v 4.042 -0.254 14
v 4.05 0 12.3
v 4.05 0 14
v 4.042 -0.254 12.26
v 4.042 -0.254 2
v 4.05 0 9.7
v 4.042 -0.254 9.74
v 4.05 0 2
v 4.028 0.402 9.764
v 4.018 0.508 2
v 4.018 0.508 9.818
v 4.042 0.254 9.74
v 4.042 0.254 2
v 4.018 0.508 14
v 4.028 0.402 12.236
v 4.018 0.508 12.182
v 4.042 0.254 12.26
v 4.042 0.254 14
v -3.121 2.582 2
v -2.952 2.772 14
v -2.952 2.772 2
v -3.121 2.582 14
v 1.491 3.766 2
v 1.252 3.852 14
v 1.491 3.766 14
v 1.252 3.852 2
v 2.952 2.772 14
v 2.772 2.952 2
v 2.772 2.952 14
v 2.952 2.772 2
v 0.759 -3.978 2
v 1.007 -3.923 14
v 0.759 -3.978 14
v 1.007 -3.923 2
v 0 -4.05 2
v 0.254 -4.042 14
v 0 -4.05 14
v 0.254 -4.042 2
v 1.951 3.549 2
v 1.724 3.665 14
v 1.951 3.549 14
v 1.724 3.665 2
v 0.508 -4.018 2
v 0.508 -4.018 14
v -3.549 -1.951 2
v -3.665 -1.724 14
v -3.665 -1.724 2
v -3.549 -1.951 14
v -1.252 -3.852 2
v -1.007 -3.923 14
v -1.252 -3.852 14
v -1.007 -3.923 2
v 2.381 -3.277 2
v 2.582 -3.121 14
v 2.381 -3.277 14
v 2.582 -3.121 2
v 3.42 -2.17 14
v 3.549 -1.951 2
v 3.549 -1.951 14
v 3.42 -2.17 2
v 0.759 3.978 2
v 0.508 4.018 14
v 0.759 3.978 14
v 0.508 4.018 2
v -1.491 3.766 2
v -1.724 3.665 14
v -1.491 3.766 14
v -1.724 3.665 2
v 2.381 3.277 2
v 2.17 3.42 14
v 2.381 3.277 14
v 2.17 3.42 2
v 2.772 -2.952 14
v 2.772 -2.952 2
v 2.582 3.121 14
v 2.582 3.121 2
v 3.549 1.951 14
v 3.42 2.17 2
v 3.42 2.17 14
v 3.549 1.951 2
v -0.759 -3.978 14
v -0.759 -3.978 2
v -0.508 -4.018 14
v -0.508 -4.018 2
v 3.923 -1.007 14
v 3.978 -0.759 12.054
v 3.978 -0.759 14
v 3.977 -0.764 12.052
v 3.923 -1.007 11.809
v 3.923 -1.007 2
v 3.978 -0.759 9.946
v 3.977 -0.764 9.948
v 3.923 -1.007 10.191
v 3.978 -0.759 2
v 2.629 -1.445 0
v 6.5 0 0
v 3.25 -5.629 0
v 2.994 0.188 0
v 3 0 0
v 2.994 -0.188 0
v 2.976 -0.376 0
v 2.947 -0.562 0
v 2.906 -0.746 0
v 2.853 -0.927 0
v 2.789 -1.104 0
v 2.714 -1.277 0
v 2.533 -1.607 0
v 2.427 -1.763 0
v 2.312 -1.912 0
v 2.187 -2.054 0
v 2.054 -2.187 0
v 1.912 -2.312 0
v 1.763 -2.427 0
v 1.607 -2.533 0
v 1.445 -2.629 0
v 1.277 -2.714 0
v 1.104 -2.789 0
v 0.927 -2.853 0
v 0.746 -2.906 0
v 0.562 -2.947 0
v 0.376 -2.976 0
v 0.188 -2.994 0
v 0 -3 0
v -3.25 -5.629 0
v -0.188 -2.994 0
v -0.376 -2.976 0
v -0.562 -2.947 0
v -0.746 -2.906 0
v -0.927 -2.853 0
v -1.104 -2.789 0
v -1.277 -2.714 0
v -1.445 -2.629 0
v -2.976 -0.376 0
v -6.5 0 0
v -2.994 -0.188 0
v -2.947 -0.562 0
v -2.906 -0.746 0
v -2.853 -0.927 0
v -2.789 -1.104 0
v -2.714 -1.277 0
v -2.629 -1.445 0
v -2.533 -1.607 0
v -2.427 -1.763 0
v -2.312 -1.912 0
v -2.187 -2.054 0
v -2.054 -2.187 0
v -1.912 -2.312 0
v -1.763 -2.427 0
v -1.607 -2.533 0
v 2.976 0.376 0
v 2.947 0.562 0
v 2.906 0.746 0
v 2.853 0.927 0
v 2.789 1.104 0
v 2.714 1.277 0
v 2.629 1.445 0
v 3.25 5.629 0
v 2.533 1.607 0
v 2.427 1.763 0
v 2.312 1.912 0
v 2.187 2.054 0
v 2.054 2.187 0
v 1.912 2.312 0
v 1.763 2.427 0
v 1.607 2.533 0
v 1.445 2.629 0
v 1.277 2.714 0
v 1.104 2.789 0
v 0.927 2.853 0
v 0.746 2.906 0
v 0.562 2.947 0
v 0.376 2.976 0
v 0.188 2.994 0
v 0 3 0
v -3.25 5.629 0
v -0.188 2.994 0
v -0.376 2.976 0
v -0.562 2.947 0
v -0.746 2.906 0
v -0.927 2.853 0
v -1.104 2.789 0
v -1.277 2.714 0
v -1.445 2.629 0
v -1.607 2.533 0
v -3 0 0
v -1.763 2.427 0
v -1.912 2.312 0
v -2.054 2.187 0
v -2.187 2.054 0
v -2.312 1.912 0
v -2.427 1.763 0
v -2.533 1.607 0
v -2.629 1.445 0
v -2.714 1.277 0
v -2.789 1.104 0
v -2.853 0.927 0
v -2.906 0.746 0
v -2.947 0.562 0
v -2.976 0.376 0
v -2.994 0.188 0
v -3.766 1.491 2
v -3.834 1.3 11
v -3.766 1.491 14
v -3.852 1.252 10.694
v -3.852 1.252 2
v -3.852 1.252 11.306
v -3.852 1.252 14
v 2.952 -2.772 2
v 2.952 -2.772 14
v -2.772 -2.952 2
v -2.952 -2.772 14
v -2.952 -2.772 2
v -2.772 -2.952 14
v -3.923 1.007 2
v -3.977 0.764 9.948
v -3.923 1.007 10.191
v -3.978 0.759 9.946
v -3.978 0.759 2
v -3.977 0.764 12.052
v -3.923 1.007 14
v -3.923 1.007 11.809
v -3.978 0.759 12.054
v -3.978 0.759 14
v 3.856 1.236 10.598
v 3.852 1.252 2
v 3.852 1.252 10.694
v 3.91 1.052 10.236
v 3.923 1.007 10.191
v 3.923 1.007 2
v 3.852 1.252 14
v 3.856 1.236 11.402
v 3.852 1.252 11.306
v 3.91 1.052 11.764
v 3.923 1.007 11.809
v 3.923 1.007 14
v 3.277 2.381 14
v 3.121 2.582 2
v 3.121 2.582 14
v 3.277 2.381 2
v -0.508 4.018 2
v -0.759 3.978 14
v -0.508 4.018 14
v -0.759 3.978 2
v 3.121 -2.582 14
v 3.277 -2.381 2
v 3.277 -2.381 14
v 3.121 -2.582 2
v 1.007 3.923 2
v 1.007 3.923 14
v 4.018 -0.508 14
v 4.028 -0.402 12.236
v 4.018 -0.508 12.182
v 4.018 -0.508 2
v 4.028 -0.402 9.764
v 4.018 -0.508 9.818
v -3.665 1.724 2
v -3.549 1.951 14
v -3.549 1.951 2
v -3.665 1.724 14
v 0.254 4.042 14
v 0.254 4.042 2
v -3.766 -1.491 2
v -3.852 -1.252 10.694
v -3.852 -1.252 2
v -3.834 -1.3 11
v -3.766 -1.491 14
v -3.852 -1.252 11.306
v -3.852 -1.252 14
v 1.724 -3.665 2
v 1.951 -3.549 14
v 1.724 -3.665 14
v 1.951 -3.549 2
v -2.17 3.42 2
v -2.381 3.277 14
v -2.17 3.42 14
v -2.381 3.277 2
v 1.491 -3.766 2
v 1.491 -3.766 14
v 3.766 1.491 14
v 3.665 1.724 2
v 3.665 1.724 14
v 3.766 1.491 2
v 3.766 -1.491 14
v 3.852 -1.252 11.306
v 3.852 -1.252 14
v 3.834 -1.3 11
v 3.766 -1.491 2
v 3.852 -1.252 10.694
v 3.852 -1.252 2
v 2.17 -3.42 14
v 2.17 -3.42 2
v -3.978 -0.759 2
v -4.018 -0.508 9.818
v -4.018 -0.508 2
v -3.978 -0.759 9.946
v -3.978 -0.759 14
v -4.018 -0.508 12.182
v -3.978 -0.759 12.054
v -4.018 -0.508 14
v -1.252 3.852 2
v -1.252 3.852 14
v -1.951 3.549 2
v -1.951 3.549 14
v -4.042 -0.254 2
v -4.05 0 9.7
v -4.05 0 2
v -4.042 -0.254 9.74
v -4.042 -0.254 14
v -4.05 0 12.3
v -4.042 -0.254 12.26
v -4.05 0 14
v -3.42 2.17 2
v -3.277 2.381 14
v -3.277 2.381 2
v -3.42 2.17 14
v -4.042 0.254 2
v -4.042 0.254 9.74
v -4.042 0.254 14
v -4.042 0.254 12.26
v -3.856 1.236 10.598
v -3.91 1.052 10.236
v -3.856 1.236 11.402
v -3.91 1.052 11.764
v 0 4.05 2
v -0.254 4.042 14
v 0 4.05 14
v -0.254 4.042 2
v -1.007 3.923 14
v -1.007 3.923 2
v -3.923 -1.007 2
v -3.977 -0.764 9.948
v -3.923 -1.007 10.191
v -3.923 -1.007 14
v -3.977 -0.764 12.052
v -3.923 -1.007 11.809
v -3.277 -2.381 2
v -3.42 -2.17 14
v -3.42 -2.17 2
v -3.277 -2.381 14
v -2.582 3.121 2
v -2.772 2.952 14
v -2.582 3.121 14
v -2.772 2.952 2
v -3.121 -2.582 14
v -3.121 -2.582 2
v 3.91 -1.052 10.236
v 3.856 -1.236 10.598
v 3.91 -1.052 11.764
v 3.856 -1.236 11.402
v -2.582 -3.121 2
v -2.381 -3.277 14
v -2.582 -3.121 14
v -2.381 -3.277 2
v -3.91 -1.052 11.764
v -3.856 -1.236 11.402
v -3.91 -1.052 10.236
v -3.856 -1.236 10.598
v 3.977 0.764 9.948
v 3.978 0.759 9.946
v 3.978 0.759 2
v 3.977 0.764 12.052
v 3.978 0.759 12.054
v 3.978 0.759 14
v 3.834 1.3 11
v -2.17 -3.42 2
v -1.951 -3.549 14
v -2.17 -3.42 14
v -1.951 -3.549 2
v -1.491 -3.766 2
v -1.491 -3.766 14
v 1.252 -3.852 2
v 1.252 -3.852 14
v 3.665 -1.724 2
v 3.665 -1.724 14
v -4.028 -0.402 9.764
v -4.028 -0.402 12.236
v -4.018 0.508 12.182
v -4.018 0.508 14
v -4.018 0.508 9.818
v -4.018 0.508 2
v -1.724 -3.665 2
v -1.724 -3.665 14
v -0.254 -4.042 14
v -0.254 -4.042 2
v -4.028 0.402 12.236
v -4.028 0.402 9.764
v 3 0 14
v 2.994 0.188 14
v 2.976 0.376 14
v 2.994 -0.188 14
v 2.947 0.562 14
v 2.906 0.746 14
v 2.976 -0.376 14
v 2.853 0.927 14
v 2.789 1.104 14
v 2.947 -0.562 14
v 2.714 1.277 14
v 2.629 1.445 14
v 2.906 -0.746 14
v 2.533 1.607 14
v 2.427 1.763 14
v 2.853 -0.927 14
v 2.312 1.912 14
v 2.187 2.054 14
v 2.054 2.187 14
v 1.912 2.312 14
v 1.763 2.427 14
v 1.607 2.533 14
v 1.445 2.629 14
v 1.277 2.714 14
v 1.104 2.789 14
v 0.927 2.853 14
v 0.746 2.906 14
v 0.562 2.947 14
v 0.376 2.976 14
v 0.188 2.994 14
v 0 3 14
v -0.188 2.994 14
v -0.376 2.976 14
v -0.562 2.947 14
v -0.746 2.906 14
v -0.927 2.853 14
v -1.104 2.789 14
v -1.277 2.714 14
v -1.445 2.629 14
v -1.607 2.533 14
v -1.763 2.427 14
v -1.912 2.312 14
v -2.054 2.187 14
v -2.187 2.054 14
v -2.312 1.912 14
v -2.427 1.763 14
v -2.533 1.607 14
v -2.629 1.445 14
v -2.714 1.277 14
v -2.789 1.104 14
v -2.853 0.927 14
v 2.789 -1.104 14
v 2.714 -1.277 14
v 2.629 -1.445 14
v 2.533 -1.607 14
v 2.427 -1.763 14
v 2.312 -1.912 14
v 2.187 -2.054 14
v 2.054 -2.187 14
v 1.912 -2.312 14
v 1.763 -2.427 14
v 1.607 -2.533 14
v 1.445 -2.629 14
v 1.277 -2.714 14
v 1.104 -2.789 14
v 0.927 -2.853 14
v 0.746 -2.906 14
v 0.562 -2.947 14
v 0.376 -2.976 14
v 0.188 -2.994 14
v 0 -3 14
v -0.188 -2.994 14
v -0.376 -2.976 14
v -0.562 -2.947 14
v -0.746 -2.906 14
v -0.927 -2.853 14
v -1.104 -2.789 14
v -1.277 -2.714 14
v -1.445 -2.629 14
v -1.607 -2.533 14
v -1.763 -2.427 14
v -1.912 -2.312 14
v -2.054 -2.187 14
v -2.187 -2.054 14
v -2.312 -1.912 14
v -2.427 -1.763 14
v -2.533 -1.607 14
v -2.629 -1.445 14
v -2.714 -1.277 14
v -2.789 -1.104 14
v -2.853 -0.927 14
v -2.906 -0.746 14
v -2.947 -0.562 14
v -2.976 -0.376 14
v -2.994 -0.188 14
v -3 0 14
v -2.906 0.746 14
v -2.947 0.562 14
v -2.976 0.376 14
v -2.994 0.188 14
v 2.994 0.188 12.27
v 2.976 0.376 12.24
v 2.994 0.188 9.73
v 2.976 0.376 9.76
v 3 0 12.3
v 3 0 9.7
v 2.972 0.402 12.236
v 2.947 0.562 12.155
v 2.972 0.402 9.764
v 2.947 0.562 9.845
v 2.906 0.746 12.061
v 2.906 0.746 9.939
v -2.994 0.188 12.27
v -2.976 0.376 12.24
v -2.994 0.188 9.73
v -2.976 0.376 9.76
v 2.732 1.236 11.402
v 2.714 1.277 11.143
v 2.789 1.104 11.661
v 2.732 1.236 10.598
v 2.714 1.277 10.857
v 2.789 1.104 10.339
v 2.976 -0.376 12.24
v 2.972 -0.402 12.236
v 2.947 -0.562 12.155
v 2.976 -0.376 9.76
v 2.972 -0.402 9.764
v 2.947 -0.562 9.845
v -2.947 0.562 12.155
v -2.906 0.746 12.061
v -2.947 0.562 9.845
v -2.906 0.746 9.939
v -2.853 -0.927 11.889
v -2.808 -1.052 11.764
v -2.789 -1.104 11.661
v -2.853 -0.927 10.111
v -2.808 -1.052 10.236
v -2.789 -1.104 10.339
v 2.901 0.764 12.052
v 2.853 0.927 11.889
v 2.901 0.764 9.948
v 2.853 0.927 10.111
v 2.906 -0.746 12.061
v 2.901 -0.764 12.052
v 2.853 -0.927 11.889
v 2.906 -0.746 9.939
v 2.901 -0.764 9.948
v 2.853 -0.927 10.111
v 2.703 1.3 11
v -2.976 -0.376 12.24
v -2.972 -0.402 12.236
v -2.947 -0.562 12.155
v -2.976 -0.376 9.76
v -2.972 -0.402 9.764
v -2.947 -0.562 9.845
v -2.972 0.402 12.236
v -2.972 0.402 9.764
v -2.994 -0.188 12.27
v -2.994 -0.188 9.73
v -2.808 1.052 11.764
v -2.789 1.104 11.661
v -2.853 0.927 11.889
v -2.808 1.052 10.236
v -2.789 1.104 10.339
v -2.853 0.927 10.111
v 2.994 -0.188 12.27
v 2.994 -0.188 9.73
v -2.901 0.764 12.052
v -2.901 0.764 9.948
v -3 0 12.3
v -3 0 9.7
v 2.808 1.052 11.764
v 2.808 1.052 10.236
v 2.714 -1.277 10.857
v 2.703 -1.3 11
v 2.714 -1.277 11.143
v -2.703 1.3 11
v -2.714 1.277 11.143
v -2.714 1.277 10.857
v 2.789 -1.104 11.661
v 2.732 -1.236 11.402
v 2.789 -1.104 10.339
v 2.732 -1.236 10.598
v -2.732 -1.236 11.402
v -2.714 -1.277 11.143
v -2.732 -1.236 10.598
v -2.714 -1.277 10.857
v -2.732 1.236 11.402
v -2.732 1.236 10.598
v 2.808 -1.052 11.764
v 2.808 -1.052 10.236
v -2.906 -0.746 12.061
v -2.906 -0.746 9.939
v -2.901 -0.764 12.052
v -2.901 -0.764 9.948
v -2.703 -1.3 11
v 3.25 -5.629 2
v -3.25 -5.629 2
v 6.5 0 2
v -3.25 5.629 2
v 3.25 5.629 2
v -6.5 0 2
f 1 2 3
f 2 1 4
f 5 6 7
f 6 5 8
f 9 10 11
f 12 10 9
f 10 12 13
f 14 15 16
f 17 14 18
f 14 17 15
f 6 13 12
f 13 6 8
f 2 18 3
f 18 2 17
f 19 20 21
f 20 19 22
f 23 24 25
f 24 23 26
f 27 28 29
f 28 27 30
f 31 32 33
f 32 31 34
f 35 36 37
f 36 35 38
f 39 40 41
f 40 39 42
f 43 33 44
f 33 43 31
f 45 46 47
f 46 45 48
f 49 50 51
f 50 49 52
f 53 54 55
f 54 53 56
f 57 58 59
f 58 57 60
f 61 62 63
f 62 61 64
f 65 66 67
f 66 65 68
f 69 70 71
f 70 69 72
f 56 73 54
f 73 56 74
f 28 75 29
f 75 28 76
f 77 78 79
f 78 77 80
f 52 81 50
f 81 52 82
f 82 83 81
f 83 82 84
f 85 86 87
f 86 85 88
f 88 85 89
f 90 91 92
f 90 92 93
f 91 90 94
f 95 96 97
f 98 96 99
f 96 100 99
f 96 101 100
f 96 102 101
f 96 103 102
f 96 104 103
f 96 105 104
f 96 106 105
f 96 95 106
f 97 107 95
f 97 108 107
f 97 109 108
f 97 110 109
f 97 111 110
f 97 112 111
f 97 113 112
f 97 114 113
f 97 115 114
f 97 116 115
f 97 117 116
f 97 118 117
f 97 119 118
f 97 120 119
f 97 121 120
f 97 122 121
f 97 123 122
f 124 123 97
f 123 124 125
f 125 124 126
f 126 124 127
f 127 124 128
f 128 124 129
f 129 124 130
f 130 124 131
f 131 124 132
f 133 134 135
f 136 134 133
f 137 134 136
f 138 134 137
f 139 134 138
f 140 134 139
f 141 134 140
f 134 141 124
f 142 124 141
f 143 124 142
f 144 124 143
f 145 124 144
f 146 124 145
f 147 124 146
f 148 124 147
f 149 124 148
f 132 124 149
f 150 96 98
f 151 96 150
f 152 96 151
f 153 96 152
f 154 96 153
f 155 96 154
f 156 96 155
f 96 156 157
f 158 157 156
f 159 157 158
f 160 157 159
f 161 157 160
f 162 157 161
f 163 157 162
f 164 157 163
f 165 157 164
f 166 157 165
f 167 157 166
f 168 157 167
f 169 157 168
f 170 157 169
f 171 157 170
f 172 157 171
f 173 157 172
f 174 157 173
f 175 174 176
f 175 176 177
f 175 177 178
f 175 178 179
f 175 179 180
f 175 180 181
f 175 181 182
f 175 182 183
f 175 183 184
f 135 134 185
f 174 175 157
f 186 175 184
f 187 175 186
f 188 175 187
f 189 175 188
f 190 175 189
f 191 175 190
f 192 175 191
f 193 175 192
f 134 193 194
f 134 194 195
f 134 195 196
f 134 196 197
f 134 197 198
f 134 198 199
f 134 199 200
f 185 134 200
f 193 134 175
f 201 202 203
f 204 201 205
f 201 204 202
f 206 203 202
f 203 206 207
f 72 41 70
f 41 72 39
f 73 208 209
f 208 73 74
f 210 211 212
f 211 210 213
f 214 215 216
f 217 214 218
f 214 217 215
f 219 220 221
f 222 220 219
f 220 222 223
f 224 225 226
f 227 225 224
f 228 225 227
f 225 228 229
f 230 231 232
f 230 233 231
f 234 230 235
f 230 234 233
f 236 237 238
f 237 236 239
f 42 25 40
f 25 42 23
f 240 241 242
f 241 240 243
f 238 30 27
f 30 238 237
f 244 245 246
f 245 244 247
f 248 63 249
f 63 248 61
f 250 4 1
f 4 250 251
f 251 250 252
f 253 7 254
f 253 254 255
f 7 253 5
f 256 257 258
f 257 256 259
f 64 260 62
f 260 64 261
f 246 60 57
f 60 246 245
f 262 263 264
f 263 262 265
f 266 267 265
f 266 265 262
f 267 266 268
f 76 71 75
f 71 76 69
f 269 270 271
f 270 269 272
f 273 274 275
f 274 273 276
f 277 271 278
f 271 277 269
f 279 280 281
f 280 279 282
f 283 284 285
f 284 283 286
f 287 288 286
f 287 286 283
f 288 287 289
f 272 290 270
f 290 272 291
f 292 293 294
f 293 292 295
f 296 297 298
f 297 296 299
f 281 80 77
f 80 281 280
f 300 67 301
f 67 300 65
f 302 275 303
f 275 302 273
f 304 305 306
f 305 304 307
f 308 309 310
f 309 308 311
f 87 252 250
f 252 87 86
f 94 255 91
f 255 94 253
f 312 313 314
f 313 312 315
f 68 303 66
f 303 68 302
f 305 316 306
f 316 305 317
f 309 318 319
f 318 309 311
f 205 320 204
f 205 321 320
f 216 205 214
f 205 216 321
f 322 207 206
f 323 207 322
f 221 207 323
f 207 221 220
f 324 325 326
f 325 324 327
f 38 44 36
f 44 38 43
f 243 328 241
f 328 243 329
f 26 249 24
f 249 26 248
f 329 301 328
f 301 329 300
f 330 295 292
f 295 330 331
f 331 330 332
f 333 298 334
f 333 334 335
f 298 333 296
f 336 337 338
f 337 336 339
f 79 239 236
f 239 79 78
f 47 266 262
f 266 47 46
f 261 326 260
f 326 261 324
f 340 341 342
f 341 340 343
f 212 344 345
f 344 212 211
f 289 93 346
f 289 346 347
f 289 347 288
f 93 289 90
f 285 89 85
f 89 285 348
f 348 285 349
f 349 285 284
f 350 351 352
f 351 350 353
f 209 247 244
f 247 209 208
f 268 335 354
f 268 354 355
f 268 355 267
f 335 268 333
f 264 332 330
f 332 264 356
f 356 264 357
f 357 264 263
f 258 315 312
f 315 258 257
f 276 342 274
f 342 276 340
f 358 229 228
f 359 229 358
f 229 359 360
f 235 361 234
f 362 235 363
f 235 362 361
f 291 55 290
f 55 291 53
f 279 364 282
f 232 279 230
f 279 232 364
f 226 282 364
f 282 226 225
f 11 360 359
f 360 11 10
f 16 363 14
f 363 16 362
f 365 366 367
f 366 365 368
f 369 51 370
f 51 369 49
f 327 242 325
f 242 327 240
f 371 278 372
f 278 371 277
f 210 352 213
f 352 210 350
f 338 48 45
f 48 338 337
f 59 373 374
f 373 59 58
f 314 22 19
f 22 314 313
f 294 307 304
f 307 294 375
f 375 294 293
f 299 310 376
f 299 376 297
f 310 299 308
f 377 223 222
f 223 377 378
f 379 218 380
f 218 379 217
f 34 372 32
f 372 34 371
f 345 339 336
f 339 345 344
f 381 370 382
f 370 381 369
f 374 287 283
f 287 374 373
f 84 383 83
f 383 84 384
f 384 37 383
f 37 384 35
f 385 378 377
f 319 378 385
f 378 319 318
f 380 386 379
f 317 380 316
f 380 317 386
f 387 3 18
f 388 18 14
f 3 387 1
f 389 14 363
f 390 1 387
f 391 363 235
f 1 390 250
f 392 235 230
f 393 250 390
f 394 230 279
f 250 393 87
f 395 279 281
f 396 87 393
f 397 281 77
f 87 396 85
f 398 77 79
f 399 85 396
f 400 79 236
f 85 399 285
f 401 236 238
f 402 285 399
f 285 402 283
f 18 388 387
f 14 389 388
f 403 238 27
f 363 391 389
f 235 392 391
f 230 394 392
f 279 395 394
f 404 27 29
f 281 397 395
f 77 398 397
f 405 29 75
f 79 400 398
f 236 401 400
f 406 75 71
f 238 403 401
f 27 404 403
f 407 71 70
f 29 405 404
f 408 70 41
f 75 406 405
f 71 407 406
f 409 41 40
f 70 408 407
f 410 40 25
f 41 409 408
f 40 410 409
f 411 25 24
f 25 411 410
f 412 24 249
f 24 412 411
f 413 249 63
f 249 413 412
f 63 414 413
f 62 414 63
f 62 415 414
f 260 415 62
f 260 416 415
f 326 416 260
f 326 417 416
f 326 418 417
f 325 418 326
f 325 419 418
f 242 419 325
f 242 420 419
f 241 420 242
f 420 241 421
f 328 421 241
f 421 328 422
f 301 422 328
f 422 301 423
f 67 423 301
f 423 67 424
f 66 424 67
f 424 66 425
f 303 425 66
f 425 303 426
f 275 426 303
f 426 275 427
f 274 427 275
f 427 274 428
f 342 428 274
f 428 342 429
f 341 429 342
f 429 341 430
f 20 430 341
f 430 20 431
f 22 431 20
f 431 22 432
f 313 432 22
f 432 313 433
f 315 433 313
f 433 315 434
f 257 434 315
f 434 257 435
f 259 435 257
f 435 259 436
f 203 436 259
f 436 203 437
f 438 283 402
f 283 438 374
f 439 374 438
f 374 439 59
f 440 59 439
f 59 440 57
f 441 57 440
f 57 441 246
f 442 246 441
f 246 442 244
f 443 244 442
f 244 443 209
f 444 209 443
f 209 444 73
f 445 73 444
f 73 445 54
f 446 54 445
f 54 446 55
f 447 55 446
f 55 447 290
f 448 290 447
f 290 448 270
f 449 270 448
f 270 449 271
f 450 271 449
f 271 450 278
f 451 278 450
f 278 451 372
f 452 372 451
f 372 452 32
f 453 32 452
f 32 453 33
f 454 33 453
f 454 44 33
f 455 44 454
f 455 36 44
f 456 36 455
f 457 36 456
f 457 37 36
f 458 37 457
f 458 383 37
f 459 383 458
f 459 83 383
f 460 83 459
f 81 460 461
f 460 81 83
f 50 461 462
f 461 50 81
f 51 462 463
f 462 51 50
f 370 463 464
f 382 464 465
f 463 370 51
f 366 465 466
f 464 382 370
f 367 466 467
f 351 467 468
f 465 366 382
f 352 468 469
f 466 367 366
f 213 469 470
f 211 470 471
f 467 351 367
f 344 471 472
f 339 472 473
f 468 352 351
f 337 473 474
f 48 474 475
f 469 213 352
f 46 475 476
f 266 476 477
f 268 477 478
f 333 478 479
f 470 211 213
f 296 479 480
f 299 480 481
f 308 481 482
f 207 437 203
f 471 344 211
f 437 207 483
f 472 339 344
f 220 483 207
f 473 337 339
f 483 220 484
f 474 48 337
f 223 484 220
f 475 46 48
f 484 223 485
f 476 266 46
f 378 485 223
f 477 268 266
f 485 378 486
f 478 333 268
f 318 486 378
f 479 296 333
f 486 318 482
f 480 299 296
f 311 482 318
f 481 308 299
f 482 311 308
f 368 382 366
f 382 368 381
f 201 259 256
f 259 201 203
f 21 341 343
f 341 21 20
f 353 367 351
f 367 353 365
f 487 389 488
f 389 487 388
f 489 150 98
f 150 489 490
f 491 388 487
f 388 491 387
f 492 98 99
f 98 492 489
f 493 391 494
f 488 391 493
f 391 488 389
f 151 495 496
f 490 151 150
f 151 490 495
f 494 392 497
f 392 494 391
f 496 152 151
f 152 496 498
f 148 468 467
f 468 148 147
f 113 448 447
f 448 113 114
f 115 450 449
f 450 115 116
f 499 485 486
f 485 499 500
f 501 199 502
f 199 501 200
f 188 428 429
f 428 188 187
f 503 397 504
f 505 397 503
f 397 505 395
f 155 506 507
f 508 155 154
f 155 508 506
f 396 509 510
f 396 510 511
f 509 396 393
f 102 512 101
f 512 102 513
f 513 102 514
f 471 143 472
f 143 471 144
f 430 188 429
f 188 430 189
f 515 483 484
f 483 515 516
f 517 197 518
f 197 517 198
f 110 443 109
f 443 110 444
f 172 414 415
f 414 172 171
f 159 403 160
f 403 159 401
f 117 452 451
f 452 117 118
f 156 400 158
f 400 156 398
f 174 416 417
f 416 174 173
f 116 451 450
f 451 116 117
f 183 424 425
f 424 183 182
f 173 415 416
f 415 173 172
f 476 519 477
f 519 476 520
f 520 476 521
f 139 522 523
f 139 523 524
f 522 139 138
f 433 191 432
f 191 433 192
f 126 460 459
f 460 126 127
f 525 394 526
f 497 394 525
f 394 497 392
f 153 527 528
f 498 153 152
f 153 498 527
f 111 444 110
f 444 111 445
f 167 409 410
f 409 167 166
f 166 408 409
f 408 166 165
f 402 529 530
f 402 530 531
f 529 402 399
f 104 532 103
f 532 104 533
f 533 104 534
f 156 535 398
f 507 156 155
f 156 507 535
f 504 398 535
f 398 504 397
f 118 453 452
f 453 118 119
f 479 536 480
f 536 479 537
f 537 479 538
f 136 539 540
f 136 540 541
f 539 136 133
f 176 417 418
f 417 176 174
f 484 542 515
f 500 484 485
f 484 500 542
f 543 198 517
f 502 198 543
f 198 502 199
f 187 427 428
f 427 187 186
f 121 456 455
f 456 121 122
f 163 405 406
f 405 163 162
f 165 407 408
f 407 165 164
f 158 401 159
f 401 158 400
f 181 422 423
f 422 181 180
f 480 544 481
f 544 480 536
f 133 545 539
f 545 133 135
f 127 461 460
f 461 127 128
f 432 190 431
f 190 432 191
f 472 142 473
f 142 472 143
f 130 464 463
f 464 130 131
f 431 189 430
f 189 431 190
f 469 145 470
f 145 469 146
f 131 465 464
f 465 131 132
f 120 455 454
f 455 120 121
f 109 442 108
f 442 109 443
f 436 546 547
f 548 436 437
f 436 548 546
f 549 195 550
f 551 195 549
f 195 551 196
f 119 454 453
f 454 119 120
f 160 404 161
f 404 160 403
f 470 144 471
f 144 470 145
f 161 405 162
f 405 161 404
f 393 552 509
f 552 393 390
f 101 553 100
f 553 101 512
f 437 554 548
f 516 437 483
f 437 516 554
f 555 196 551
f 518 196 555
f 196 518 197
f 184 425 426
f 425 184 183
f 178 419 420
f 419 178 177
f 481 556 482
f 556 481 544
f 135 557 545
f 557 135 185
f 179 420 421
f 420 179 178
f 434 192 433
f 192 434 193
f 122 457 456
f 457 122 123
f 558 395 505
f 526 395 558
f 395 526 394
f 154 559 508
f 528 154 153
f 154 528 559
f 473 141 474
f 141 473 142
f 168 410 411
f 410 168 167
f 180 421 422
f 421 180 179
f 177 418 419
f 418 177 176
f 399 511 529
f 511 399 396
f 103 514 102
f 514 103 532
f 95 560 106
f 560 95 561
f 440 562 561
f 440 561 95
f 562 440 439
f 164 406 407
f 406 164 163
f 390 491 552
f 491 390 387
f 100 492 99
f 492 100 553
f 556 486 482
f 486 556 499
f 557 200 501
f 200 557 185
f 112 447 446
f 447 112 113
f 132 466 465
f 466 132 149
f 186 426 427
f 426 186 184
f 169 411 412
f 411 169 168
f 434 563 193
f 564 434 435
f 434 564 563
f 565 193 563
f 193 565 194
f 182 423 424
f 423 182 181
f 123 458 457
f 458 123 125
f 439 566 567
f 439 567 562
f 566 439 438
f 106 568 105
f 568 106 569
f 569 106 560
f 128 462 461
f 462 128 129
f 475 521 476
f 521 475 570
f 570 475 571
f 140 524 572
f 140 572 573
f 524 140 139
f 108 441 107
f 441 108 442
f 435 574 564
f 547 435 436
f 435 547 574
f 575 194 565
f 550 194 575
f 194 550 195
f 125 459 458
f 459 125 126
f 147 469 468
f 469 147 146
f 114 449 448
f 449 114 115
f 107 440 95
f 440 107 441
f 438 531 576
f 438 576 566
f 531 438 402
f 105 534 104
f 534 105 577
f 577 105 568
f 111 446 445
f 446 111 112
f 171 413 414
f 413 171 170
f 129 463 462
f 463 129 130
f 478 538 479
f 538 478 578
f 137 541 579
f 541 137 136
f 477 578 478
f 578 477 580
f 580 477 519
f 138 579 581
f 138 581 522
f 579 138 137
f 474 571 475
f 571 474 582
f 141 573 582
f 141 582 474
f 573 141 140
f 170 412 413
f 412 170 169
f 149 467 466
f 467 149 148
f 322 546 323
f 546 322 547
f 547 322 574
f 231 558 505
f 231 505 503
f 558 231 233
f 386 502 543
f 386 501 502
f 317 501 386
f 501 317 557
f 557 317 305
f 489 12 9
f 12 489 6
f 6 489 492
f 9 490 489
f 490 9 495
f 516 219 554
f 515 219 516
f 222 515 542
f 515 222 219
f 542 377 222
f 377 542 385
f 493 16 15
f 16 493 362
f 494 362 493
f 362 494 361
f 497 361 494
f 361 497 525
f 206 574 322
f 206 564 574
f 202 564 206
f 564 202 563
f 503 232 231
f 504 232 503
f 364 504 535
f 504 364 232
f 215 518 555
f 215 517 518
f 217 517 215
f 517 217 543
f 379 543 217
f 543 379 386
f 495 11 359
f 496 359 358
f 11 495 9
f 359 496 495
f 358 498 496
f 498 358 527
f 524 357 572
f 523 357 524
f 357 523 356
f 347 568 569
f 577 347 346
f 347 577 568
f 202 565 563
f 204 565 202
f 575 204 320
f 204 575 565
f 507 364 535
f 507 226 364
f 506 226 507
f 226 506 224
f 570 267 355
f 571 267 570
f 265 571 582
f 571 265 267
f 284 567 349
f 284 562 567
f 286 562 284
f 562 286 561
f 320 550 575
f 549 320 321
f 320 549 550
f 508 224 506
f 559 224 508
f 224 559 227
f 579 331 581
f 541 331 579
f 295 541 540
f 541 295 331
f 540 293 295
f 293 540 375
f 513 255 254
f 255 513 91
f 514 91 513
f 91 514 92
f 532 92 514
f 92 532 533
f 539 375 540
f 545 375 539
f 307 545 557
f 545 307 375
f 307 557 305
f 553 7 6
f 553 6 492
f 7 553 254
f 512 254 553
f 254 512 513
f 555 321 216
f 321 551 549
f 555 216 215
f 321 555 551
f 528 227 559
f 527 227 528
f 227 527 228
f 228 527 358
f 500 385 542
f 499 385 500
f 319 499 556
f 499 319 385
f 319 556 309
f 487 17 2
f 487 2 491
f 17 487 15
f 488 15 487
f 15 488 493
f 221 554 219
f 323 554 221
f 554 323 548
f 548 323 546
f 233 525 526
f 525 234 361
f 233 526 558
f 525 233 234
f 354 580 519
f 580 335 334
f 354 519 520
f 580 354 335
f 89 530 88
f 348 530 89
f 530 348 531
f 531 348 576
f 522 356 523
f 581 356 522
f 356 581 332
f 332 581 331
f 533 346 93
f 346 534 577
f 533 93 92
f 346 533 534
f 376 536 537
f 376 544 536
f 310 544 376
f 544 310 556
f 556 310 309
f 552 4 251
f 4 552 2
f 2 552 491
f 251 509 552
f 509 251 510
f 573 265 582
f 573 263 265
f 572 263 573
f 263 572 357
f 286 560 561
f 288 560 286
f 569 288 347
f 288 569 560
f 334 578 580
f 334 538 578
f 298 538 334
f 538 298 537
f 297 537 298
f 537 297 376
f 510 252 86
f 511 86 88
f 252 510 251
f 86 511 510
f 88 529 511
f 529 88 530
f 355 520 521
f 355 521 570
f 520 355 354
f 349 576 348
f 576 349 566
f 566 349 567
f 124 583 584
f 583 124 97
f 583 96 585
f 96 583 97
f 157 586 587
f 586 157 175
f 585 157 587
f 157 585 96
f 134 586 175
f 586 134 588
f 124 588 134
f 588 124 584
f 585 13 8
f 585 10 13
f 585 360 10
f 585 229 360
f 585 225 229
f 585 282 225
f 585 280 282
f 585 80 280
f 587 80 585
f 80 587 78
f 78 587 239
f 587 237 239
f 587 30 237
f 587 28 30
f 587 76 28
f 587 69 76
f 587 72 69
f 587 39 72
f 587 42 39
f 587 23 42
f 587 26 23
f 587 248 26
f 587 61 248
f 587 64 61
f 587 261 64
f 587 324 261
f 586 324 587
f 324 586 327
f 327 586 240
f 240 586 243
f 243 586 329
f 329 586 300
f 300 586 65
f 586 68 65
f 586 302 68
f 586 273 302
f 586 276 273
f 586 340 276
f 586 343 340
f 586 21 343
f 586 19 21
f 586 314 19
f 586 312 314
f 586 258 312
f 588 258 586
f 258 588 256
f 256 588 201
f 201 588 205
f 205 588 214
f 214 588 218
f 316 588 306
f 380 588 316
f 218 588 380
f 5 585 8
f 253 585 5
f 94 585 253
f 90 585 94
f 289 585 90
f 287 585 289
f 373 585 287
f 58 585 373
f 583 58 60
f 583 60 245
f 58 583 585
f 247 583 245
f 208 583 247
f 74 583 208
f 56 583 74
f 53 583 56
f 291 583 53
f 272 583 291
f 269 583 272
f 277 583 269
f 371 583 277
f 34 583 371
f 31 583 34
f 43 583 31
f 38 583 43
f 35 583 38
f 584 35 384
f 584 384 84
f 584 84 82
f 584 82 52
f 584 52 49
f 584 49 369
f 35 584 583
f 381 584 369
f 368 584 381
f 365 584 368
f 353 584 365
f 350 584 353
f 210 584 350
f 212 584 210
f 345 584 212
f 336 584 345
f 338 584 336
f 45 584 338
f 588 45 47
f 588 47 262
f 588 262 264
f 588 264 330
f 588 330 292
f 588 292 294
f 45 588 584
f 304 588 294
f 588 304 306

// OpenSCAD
// ===  6mm to 8mm shaft adaptor
// ===  J.Beale July 18 2014

D1 = 8.1;	// OD: fit inside 8mm bearing (7.9: measure 7.7)
D2 = 6.0;	// ID:  allow 5.8 mm OD threaded rod in (5.6 => 5.15)
D3 = 13;    // OD: flange on one end
L1 = 14;    // overall length
L2 = 2;     // height of flange portion
DSS = 2.6;  // diameter for M3 setscrew with some thread bite
HSS = 4;    // z-height from center of hole for M3 setscrew

// ==========================================================
fn = 100;	// number of facets on cylinder
eps = 0.05; // a small number

module adapt1() {
 translate([0,0,L1/2])
  difference() {
		cylinder(r=D1/2,h=L1,center=true,$fn=fn); // outer shell
		// translate([0,0,-eps]) 
         cylinder(r=D2/2,h=L1+eps,center=true,$fn=fn); // inner bore
	   translate([0,0,HSS]) rotate([0,90,0])  
			cylinder(r=DSS/2,h=D1*2,$fn=20,center=true); // setscrew #1
	   // translate([0,0,-HSS]) rotate([0,-90,0]) cylinder(r=DSS/2,h=D1*2,$fn=20); // setscrew #2
  }
} // end module


module flange() {
 translate([0,0,L2/2])
  difference() {
    cylinder(r=D3/2,h=L2,center=true,$fn=6); // hex flange
    cylinder(r=D2/2,h=L1+eps,center=true,$fn=fn); // inner bore

 }
}

adapt1();
flange();
